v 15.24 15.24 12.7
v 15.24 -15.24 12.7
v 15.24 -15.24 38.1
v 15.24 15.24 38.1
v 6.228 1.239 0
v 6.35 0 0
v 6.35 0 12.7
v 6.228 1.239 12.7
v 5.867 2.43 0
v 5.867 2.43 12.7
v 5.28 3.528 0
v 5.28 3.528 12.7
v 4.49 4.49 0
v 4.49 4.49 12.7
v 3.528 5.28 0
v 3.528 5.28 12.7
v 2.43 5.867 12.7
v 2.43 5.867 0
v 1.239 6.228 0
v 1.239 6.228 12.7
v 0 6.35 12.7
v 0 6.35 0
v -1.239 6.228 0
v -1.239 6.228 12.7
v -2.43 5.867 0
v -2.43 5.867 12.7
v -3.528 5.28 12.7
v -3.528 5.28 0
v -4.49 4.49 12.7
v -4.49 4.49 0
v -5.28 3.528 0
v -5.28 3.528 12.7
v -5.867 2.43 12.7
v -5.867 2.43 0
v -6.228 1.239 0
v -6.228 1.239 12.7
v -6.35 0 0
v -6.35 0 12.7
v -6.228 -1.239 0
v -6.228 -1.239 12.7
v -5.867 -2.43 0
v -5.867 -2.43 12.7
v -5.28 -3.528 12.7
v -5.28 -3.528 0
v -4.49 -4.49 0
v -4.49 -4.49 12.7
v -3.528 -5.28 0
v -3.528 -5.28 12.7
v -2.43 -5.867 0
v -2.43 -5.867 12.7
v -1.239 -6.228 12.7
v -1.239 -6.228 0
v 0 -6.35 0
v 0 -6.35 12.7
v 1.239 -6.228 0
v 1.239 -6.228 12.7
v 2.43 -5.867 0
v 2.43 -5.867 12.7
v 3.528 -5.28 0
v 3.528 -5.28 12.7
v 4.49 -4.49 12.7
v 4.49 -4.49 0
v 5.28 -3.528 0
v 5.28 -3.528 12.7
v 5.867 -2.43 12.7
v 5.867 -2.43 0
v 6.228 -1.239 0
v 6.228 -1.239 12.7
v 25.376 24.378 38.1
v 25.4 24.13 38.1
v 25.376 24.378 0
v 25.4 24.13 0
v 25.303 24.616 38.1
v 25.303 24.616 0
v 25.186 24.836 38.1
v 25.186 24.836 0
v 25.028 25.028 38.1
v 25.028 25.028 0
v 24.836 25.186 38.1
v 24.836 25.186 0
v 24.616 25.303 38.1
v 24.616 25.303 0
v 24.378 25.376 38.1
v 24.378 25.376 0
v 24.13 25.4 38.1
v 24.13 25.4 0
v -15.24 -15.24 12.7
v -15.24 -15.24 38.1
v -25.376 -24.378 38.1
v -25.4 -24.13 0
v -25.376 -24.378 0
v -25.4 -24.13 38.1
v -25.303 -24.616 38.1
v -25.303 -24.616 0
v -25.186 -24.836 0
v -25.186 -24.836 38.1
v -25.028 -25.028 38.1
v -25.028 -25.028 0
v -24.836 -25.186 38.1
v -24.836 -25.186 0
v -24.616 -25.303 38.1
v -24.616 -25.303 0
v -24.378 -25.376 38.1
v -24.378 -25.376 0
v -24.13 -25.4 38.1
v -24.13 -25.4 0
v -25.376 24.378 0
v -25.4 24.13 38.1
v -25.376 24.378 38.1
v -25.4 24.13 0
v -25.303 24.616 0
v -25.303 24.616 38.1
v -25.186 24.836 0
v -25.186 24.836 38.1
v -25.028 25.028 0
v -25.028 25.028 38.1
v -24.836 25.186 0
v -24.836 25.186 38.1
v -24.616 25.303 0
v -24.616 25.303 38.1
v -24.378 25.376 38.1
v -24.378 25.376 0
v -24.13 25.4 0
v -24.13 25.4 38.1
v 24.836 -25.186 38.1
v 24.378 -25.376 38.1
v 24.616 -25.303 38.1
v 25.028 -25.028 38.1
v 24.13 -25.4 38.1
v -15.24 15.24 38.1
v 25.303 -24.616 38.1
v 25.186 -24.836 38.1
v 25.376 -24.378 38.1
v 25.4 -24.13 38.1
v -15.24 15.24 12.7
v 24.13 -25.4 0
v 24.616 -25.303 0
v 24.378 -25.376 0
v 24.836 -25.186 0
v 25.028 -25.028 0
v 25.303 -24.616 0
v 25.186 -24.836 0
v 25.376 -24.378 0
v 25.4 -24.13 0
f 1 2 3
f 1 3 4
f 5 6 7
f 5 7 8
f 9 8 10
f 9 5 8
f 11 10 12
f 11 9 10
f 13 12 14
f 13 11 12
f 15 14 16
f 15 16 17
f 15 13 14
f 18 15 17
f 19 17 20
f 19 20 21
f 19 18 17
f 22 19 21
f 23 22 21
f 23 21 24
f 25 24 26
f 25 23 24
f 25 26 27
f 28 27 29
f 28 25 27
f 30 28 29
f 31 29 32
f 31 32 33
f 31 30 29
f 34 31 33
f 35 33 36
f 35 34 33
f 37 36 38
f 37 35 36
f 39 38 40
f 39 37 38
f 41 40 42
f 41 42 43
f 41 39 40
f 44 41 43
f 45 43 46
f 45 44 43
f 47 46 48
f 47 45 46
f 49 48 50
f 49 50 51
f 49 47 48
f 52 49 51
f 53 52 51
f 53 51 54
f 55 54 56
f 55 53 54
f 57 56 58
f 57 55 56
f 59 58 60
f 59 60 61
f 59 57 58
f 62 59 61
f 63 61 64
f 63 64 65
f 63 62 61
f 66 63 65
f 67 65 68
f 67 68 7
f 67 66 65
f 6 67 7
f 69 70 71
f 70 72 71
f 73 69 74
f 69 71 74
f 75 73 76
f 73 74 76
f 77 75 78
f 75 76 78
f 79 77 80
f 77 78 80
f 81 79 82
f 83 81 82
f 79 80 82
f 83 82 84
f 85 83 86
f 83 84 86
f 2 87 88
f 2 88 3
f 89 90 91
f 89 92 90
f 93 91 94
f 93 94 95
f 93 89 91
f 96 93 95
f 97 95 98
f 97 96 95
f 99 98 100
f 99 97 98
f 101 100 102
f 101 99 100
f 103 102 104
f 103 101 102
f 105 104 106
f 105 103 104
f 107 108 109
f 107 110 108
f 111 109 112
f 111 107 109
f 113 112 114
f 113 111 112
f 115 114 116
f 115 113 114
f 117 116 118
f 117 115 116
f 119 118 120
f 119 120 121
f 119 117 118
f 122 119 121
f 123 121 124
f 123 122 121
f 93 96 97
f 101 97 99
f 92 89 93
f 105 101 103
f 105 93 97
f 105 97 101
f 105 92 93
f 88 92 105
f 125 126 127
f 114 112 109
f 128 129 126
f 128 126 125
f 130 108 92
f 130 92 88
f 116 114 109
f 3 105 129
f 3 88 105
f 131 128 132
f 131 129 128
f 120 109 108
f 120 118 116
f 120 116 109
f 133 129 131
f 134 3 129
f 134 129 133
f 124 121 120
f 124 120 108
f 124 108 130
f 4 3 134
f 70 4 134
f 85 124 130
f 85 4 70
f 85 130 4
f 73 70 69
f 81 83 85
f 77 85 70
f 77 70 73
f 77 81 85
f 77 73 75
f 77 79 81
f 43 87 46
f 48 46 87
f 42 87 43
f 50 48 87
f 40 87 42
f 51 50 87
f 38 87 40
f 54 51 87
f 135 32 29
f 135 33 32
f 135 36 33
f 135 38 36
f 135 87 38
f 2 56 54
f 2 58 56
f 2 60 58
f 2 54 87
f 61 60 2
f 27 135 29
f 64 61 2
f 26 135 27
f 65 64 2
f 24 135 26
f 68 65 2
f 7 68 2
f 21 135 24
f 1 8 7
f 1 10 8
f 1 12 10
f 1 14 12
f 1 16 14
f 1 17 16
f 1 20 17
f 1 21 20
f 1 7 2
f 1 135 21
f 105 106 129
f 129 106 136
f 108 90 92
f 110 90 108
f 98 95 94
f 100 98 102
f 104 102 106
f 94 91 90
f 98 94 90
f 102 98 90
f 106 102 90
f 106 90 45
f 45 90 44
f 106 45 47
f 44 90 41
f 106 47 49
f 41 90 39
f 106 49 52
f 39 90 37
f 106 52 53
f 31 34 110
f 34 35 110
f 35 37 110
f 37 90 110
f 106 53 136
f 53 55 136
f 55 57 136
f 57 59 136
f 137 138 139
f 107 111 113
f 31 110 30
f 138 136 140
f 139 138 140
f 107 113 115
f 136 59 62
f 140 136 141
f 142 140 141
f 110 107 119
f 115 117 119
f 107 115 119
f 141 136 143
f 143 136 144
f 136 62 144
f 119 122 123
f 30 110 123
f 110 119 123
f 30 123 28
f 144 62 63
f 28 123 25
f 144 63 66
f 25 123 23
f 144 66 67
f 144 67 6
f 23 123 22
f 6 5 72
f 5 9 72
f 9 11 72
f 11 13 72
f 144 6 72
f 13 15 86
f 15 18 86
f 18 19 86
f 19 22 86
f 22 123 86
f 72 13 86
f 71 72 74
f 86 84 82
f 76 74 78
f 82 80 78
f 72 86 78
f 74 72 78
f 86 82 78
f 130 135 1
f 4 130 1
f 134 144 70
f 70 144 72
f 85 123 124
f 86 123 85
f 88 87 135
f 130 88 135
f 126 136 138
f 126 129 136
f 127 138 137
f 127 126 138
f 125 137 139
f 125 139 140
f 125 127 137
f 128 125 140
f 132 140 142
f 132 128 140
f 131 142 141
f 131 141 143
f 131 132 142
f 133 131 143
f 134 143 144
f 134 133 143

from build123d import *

# Parameters (mm, degrees)
F0_W     = 50.8
F0_H     = 50.8
F0_R     = 6.35
F1_DEPTH = 12.7
F2_W     = 50.8
F2_H     = 50.8
F2_W_2   = 30.48
F2_H_2   = 30.48
F3_DEPTH = 25.4
F4_R     = 1.27


with BuildPart() as f1:
    # F0 (on Top) → F1 (new body)
    with BuildSketch(Plane.XY):
        Rectangle(F0_W, F0_H)
        Circle(F0_R, mode=Mode.SUBTRACT)
    extrude(amount=F1_DEPTH)

    # F2 (on face) → F3 (join)
    with BuildSketch(Plane.XY.offset(12.7)):
        Rectangle(F2_W, F2_H)
        Rectangle(F2_W_2, F2_H_2, mode=Mode.SUBTRACT)
    extrude(amount=F3_DEPTH)

    # F4
    f4_edges = [f1.edges().sort_by_distance(p)[0] for p in [
        (25.4, -25.4, 19.05),
        (25.4, 25.4, 19.05),
        (-25.4, -25.4, 19.05),
        (-25.4, 25.4, 19.05),
    ]]
    fillet(f4_edges, radius=F4_R)


solid = f1.part
